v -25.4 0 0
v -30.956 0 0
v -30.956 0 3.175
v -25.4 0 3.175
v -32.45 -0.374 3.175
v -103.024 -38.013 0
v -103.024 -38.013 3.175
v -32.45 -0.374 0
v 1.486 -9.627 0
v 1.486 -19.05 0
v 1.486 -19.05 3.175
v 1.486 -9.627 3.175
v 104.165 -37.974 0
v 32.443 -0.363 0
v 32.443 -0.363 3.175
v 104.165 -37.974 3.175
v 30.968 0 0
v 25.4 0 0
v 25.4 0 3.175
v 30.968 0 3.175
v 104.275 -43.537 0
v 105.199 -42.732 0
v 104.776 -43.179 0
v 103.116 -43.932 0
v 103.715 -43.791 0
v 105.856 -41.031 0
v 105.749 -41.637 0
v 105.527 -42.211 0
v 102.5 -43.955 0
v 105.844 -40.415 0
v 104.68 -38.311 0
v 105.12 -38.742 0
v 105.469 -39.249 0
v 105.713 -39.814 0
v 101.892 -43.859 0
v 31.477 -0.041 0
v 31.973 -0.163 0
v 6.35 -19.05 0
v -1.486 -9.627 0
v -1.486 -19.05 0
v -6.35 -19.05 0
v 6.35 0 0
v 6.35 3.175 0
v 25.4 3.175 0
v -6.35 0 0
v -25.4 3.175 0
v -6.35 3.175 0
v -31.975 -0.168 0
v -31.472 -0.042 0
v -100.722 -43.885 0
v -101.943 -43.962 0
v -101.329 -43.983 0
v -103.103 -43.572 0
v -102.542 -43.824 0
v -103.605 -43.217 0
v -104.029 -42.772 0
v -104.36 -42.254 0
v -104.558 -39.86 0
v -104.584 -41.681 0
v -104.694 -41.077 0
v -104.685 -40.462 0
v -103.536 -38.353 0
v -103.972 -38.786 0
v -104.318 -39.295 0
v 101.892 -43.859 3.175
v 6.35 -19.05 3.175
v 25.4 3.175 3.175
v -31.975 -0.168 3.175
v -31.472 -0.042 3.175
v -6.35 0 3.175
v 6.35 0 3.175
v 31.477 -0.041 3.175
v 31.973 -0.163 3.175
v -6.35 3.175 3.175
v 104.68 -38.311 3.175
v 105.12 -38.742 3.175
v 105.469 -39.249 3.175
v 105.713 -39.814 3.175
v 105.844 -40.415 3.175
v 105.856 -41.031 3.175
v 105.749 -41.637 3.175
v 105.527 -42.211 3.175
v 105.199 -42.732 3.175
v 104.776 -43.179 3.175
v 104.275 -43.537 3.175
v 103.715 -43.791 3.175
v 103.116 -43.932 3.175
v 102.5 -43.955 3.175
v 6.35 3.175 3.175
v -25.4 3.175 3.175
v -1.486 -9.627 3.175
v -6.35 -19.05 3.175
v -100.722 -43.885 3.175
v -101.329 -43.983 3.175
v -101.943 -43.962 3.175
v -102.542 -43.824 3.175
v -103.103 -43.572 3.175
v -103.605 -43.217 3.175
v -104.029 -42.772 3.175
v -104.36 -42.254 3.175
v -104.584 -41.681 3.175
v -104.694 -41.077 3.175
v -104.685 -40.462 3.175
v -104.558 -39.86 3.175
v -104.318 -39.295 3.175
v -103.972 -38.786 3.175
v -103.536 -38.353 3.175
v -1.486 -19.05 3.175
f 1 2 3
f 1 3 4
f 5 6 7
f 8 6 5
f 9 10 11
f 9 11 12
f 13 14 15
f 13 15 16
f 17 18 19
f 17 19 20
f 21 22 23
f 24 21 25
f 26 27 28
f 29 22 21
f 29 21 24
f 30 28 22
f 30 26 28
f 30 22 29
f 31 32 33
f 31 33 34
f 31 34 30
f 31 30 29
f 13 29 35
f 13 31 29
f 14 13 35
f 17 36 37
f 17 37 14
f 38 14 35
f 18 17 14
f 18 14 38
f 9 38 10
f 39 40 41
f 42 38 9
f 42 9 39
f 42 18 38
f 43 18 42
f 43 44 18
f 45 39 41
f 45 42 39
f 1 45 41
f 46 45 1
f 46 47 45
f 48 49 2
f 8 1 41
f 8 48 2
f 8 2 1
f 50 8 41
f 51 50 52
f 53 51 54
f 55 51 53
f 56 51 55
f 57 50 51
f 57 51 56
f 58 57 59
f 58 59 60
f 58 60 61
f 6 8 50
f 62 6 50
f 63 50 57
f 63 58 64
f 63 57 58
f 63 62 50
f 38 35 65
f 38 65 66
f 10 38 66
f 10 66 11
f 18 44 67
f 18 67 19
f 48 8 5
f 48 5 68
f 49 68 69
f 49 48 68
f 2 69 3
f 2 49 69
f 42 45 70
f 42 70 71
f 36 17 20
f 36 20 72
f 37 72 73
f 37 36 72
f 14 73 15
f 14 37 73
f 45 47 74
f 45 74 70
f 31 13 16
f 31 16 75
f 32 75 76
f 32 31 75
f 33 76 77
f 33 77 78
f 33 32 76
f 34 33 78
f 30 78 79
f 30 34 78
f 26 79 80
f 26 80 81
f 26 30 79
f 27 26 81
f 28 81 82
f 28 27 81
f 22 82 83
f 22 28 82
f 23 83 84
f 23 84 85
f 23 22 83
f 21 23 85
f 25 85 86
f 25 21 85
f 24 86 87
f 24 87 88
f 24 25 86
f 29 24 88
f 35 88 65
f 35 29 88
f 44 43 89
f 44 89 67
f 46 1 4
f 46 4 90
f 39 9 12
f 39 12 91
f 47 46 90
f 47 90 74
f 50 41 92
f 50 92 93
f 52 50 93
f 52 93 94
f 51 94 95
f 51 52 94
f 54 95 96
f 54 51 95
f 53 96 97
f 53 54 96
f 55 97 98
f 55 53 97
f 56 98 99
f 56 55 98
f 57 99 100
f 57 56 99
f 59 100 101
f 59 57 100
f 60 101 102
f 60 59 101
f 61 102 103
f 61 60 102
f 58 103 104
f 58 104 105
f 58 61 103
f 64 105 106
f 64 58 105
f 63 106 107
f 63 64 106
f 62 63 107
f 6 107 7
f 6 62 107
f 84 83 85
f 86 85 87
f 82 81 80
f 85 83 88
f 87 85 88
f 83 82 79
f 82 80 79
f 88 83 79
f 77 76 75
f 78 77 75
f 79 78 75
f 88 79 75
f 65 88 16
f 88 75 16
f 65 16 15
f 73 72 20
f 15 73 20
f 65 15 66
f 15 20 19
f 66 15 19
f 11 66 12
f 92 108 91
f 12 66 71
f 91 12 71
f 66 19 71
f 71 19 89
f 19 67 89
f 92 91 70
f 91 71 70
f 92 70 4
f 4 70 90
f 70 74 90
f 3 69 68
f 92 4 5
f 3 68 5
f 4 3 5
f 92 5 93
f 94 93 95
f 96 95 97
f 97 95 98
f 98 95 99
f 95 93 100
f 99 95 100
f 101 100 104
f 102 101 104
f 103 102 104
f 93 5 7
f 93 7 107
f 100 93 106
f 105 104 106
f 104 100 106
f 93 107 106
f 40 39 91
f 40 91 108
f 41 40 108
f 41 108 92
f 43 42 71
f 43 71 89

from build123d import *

# Parameters (mm, degrees)
BOSS_EXTRUDE1_DEPTH = 3.175


with BuildPart() as part:
    # Sketch1 → Boss-Extrude1 (new body)
    with BuildSketch(Plane.XY):
        with BuildLine():
            Line((25.4, 0), (30.968022768, 0))
            ThreePointArc((30.968022768, 0), (31.727309935, -0.092126666), (32.442533736, -0.363160318))
            Line((32.442533736, -0.363160318), (104.164919452, -37.973926384))
            ThreePointArc((104.164919452, -37.973926384), (105.652252875, -41.929489282), (101.892440564, -43.858854448))
            Line((101.892440564, -43.858854448), (6.35, -19.05))
            Line((6.35, -19.05), (1.4859, -19.05))
            Line((1.4859, -19.05), (1.4859, -9.6266))
            Line((1.4859, -9.6266), (-1.4859, -9.6266))
            Line((-1.4859, -9.6266), (-1.4859, -19.05))
            Line((-1.4859, -19.05), (-6.35, -19.05))
            Line((-6.35, -19.05), (-100.721752752, -43.884671777))
            ThreePointArc((-100.721752752, -43.884671777), (-104.48570891, -41.973107935), (-103.023886624, -38.012739532))
            Line((-103.023886624, -38.012739532), (-32.450367647, -0.373529412))
            ThreePointArc((-32.450367647, -0.373529412), (-31.726300609, -0.094797562), (-30.95625, 0))
            Line((-30.95625, 0), (-25.4, 0))
            Line((-25.4, 0), (-25.399999646, 3.174999957))
            Line((-25.399999646, 3.174999957), (-6.349999646, 3.174999957))
            Line((-6.349999646, 3.174999957), (-6.35, 0))
            Line((-6.35, 0), (6.35, 0))
            Line((6.35, 0), (6.350000354, 3.174999957))
            Line((6.350000354, 3.174999957), (25.400000354, 3.174999957))
            Line((25.400000354, 3.174999957), (25.4, 0))
        make_face()
    extrude(amount=BOSS_EXTRUDE1_DEPTH)


solid = part.part
